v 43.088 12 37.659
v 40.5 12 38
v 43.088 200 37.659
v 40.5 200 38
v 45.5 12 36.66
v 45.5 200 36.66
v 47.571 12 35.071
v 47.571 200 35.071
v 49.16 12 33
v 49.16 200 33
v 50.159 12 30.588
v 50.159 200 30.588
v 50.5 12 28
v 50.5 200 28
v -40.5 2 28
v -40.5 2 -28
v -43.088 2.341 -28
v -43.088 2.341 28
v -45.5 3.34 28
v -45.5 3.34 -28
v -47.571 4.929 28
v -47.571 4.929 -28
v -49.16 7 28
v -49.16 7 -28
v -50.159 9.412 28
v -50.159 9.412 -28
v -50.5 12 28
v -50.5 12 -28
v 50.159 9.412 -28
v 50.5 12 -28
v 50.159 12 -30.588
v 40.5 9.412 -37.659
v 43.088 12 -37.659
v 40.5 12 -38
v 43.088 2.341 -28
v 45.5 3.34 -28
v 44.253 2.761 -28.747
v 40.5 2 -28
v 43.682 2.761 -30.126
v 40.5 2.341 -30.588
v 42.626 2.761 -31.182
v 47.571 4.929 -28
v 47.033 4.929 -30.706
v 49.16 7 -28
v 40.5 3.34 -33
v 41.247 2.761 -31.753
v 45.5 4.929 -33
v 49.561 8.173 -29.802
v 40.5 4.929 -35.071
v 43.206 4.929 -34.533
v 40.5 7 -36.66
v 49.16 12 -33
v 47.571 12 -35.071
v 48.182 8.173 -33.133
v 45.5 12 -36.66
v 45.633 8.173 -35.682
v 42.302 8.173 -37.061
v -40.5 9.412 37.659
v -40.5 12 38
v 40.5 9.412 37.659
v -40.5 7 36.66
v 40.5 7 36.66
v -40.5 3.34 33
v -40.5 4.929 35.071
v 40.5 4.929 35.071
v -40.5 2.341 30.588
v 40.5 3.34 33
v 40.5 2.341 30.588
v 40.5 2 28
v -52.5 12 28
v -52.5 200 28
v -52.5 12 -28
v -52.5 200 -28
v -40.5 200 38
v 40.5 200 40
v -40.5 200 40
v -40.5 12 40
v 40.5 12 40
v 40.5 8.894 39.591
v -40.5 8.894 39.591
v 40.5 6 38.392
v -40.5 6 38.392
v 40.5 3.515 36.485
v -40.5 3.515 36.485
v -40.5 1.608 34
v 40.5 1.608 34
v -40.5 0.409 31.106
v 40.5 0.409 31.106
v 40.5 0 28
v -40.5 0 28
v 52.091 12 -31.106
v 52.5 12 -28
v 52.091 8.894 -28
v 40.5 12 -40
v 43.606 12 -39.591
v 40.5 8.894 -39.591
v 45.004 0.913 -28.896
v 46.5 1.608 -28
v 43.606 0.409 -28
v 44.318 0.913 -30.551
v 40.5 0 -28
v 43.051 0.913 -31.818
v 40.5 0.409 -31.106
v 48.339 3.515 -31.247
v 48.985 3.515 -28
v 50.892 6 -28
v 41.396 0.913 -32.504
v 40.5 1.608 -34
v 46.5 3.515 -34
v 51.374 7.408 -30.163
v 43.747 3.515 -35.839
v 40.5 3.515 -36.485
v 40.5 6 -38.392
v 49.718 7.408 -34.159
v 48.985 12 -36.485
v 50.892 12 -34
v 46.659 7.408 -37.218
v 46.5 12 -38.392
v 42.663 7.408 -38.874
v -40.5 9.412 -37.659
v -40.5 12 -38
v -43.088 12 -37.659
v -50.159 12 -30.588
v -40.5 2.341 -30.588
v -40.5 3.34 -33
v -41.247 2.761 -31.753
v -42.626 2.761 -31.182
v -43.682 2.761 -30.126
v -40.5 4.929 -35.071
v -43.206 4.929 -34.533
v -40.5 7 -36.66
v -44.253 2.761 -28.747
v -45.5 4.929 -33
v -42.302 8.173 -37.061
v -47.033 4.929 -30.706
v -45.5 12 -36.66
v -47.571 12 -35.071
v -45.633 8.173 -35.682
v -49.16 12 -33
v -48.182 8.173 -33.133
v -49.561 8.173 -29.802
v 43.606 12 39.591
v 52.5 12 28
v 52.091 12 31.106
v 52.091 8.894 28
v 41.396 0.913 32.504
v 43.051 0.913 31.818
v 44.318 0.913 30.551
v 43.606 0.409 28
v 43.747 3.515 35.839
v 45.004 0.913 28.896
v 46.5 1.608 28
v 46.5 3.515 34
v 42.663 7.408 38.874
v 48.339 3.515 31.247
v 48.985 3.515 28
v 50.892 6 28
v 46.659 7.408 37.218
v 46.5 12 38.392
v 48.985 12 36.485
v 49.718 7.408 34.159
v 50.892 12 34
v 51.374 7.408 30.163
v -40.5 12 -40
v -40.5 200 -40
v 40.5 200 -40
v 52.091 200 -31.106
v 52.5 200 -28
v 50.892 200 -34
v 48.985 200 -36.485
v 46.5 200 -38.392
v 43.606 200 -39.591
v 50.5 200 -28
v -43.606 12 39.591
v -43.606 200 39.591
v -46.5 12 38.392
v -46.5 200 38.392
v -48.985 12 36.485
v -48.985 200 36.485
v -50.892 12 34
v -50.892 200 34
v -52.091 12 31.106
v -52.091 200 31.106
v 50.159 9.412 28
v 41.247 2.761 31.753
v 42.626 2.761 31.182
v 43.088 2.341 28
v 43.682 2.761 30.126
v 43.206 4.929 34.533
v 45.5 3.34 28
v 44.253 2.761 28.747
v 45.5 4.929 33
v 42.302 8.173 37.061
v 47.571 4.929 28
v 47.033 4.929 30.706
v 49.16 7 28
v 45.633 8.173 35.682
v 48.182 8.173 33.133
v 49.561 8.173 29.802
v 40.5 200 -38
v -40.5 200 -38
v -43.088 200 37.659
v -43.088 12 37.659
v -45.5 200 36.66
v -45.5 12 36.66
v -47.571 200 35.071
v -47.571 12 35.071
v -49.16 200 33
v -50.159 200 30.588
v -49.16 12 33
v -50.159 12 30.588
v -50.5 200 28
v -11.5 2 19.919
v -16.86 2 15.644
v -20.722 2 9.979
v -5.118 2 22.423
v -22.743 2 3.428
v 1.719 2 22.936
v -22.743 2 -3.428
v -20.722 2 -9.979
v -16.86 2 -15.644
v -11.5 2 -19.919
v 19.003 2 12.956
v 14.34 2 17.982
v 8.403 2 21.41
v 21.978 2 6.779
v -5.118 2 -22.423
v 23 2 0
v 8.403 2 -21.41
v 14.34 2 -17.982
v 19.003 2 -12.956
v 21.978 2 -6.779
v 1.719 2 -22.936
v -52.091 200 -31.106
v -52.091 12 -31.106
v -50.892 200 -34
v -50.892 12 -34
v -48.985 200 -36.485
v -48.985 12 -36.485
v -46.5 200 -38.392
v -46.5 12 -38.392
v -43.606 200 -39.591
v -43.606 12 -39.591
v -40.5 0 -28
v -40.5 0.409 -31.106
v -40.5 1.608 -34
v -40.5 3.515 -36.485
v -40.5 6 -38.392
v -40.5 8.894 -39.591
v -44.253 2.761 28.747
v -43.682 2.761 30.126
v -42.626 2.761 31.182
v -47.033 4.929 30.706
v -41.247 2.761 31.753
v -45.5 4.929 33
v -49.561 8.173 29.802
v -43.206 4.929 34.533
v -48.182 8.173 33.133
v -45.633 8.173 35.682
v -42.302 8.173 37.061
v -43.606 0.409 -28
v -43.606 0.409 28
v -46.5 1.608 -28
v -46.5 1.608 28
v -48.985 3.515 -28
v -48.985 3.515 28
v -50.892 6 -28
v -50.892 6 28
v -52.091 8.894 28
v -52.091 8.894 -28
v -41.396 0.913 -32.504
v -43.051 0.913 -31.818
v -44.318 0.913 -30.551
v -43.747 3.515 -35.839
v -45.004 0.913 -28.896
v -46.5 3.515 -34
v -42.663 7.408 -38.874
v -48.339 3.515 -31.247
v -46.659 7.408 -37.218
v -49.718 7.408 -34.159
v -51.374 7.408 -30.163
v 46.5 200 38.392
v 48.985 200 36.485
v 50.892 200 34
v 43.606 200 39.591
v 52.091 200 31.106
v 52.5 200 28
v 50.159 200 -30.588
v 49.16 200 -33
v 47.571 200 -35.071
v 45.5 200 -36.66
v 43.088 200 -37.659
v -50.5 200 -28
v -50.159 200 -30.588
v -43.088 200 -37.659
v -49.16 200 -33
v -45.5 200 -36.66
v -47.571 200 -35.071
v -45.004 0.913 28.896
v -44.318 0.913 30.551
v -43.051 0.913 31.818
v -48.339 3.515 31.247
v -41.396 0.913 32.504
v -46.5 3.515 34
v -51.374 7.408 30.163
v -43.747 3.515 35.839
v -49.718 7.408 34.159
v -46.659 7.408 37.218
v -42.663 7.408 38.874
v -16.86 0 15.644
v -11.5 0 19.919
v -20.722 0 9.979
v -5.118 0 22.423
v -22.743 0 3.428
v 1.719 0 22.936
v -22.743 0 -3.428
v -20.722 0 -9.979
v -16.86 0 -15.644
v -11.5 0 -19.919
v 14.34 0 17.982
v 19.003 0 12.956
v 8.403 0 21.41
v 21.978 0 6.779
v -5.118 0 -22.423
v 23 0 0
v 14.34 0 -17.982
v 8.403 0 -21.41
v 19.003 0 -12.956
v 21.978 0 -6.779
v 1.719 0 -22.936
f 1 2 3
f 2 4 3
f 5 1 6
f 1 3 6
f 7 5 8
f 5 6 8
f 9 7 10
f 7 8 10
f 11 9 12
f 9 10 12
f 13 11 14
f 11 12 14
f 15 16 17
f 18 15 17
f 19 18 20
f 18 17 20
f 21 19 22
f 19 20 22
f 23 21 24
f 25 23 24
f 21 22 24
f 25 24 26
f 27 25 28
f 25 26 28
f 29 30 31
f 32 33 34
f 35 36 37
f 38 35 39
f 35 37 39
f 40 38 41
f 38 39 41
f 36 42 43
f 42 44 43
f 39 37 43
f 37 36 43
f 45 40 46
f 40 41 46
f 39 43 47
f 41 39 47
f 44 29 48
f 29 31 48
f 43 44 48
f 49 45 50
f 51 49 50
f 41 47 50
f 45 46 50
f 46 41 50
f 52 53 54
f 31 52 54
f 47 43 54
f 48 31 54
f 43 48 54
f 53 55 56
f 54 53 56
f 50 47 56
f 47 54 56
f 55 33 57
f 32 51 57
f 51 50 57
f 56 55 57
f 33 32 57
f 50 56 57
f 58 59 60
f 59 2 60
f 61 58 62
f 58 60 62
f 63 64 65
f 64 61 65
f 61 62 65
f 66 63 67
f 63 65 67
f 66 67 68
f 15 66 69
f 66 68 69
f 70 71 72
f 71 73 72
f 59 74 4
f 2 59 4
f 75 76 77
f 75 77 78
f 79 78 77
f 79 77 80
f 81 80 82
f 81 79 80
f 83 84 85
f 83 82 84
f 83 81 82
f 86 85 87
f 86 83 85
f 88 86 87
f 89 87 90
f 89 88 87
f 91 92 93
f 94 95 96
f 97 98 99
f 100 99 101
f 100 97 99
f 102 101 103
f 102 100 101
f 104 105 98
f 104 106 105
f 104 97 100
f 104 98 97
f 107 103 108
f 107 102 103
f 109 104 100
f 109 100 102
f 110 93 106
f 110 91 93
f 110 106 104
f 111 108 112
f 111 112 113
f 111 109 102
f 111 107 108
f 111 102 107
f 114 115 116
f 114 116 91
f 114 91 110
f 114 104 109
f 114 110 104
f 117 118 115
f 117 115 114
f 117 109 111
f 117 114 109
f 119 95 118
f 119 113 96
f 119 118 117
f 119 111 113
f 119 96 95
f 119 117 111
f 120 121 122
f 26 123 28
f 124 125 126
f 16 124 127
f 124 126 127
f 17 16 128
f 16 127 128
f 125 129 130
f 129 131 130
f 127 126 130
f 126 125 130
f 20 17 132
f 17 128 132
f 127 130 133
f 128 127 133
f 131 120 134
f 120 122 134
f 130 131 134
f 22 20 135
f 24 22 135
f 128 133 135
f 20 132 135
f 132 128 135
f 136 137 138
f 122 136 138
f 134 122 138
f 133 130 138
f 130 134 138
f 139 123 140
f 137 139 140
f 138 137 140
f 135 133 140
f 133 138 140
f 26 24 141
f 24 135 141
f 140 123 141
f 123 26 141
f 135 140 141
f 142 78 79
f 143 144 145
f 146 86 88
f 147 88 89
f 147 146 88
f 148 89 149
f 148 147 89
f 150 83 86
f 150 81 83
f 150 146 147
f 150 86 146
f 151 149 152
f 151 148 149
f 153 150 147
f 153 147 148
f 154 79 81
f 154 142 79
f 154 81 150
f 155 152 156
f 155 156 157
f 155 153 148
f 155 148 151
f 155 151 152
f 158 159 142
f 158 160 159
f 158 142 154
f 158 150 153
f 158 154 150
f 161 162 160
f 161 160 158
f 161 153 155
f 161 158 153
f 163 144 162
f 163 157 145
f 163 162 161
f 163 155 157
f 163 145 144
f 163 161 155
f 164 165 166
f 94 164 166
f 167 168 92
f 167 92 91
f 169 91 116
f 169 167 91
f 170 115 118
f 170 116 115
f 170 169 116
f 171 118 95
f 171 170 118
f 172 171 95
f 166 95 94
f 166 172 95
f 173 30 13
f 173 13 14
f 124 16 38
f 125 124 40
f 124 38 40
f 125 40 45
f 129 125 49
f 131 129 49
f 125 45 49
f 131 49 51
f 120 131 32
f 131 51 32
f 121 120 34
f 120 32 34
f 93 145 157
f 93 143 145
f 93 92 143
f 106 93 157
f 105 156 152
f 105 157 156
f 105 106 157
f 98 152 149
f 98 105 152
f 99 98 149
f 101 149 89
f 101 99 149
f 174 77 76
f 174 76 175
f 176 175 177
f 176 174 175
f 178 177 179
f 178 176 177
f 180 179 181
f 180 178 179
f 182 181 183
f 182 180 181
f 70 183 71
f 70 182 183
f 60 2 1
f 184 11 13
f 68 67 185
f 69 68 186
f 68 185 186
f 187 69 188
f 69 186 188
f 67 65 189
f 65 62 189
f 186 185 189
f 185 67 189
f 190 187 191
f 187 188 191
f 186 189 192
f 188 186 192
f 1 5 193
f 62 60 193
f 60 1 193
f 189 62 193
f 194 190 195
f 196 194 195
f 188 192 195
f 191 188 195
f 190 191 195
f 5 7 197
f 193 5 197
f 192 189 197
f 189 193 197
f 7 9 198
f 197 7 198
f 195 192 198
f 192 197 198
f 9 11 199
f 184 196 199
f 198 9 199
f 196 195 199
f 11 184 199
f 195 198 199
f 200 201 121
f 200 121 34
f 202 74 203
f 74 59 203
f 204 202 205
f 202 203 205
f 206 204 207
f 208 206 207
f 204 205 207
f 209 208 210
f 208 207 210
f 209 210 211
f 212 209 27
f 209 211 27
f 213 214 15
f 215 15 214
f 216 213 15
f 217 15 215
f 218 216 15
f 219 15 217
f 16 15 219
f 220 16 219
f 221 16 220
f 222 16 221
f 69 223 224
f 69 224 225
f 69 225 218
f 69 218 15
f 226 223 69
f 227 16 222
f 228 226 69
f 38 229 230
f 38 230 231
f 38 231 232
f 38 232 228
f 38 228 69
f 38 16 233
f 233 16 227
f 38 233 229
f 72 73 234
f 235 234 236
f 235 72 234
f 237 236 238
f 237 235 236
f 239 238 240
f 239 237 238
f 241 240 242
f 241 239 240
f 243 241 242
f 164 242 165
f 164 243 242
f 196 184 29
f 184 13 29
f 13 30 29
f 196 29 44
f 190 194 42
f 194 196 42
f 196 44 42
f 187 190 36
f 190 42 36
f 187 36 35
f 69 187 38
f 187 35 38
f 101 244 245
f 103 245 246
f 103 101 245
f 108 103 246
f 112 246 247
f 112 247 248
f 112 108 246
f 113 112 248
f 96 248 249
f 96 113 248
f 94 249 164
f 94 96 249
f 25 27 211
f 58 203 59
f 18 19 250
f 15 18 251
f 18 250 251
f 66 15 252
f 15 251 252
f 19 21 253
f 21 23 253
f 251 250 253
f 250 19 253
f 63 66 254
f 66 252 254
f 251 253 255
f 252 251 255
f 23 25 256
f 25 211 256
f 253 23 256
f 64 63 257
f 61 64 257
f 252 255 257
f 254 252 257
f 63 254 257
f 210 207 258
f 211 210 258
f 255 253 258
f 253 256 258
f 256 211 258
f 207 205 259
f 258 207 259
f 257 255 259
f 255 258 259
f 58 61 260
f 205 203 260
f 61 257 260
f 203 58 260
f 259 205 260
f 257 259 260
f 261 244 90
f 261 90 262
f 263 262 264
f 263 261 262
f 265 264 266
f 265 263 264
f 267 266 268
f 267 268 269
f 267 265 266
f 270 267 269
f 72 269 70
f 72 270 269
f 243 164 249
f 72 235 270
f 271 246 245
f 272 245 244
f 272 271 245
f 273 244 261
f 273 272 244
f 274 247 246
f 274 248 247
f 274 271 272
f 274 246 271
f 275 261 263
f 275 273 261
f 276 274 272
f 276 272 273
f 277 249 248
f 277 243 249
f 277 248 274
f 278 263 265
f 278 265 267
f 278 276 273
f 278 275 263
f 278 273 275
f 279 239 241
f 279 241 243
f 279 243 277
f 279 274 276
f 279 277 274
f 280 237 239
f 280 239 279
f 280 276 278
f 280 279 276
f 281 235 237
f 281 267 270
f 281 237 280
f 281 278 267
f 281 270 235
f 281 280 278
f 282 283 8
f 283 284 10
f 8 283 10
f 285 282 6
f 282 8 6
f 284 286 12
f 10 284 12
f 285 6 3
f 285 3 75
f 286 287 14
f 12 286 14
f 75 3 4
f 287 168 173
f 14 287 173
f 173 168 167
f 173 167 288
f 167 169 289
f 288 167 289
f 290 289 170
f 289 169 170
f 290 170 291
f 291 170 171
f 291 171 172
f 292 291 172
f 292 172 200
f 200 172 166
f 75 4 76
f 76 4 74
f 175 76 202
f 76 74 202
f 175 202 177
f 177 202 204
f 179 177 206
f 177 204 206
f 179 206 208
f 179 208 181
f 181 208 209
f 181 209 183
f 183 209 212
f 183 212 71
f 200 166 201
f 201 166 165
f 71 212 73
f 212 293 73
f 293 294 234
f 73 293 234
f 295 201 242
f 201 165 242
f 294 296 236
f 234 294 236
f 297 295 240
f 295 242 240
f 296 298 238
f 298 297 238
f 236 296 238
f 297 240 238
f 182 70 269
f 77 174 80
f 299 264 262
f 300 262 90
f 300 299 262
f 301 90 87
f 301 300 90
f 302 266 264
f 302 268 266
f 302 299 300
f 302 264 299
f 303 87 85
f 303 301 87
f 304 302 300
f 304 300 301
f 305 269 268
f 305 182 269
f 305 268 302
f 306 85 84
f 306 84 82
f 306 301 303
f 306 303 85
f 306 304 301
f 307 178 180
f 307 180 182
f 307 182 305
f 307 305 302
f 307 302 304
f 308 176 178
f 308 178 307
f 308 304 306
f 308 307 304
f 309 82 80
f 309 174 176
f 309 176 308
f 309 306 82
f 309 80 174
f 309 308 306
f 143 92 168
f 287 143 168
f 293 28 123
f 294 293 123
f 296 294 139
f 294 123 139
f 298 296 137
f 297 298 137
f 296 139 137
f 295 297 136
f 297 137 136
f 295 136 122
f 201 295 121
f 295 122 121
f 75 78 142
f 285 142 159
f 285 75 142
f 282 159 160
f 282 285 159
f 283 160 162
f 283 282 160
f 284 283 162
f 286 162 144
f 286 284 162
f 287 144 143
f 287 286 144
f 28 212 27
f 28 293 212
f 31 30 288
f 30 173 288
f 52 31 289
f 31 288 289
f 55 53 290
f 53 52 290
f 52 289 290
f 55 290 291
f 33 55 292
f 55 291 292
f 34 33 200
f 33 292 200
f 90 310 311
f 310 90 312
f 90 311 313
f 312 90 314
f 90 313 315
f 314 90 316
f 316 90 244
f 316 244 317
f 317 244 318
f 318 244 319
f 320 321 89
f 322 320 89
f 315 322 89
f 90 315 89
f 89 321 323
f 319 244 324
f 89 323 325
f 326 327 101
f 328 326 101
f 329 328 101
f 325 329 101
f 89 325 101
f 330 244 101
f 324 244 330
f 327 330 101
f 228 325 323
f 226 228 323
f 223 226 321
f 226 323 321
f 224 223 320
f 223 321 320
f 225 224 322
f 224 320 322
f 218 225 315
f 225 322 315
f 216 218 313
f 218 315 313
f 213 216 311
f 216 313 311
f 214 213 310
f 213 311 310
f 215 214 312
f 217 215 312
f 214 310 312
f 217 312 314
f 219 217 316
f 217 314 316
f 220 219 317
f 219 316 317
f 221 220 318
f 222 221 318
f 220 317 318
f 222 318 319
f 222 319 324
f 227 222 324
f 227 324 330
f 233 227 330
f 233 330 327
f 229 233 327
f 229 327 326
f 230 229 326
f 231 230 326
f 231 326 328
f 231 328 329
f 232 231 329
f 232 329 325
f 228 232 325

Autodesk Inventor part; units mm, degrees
ref_plane "YZ Plane" through (0, 0, 0) normal (1, 0, 0) x (0, 1, 0)
ref_plane "XZ Plane" through (0, 0, 0) normal (0, 1, 0) x (-1, 0, 0)
ref_plane "XY Plane" through (0, 0, 0) normal (0, 0, 1) x (1, 0, 0)
sketch "Sketch1" plane through (0, 0, 0) normal (0, 0, 1) x (1, 0, 0)
  line L0 (52.5, 200) -> (-52.5, 200)
  line L1 (-52.5, 200) -> (-52.5, 0)
  line L2 (-52.5, 0) -> (52.5, 0)
  line L3 (52.5, 0) -> (52.5, 200)
  point P0 (0, 0)
  point P1 (0, 0)
  dimension "d0" = 105
  dimension "d1" = 200
extrude "Extrusion1" add sketch "Sketch1" along normal mid plane 80
fillet "Fillet1" radius 12 8 edges at (52.5, 100, 40) (52.5, 100, -40) (-52.5, 100, 40) (-52.5, 100, -40) (0, 0, 40) (-52.5, 0, 0) (0, 0, -40) (52.5, 0, 0)
shell "Shell1" thickness 2 removed faces 1 at (-13.5, 200, 13.3333)
sketch "Sketch2" plane through (-40.5, 0, 28) normal (0, -1, 0) x (1, 0, 0)
  circle A0 centre (40.5, -28) radius 25 construction
  circle A1 centre (40.5, -28) radius 23
  dimension "d6" = 2
  dimension "d9" = 50
extrude "Extrusion2" cut sketch "Sketch2" against normal blind 5
properties part number "silo"
